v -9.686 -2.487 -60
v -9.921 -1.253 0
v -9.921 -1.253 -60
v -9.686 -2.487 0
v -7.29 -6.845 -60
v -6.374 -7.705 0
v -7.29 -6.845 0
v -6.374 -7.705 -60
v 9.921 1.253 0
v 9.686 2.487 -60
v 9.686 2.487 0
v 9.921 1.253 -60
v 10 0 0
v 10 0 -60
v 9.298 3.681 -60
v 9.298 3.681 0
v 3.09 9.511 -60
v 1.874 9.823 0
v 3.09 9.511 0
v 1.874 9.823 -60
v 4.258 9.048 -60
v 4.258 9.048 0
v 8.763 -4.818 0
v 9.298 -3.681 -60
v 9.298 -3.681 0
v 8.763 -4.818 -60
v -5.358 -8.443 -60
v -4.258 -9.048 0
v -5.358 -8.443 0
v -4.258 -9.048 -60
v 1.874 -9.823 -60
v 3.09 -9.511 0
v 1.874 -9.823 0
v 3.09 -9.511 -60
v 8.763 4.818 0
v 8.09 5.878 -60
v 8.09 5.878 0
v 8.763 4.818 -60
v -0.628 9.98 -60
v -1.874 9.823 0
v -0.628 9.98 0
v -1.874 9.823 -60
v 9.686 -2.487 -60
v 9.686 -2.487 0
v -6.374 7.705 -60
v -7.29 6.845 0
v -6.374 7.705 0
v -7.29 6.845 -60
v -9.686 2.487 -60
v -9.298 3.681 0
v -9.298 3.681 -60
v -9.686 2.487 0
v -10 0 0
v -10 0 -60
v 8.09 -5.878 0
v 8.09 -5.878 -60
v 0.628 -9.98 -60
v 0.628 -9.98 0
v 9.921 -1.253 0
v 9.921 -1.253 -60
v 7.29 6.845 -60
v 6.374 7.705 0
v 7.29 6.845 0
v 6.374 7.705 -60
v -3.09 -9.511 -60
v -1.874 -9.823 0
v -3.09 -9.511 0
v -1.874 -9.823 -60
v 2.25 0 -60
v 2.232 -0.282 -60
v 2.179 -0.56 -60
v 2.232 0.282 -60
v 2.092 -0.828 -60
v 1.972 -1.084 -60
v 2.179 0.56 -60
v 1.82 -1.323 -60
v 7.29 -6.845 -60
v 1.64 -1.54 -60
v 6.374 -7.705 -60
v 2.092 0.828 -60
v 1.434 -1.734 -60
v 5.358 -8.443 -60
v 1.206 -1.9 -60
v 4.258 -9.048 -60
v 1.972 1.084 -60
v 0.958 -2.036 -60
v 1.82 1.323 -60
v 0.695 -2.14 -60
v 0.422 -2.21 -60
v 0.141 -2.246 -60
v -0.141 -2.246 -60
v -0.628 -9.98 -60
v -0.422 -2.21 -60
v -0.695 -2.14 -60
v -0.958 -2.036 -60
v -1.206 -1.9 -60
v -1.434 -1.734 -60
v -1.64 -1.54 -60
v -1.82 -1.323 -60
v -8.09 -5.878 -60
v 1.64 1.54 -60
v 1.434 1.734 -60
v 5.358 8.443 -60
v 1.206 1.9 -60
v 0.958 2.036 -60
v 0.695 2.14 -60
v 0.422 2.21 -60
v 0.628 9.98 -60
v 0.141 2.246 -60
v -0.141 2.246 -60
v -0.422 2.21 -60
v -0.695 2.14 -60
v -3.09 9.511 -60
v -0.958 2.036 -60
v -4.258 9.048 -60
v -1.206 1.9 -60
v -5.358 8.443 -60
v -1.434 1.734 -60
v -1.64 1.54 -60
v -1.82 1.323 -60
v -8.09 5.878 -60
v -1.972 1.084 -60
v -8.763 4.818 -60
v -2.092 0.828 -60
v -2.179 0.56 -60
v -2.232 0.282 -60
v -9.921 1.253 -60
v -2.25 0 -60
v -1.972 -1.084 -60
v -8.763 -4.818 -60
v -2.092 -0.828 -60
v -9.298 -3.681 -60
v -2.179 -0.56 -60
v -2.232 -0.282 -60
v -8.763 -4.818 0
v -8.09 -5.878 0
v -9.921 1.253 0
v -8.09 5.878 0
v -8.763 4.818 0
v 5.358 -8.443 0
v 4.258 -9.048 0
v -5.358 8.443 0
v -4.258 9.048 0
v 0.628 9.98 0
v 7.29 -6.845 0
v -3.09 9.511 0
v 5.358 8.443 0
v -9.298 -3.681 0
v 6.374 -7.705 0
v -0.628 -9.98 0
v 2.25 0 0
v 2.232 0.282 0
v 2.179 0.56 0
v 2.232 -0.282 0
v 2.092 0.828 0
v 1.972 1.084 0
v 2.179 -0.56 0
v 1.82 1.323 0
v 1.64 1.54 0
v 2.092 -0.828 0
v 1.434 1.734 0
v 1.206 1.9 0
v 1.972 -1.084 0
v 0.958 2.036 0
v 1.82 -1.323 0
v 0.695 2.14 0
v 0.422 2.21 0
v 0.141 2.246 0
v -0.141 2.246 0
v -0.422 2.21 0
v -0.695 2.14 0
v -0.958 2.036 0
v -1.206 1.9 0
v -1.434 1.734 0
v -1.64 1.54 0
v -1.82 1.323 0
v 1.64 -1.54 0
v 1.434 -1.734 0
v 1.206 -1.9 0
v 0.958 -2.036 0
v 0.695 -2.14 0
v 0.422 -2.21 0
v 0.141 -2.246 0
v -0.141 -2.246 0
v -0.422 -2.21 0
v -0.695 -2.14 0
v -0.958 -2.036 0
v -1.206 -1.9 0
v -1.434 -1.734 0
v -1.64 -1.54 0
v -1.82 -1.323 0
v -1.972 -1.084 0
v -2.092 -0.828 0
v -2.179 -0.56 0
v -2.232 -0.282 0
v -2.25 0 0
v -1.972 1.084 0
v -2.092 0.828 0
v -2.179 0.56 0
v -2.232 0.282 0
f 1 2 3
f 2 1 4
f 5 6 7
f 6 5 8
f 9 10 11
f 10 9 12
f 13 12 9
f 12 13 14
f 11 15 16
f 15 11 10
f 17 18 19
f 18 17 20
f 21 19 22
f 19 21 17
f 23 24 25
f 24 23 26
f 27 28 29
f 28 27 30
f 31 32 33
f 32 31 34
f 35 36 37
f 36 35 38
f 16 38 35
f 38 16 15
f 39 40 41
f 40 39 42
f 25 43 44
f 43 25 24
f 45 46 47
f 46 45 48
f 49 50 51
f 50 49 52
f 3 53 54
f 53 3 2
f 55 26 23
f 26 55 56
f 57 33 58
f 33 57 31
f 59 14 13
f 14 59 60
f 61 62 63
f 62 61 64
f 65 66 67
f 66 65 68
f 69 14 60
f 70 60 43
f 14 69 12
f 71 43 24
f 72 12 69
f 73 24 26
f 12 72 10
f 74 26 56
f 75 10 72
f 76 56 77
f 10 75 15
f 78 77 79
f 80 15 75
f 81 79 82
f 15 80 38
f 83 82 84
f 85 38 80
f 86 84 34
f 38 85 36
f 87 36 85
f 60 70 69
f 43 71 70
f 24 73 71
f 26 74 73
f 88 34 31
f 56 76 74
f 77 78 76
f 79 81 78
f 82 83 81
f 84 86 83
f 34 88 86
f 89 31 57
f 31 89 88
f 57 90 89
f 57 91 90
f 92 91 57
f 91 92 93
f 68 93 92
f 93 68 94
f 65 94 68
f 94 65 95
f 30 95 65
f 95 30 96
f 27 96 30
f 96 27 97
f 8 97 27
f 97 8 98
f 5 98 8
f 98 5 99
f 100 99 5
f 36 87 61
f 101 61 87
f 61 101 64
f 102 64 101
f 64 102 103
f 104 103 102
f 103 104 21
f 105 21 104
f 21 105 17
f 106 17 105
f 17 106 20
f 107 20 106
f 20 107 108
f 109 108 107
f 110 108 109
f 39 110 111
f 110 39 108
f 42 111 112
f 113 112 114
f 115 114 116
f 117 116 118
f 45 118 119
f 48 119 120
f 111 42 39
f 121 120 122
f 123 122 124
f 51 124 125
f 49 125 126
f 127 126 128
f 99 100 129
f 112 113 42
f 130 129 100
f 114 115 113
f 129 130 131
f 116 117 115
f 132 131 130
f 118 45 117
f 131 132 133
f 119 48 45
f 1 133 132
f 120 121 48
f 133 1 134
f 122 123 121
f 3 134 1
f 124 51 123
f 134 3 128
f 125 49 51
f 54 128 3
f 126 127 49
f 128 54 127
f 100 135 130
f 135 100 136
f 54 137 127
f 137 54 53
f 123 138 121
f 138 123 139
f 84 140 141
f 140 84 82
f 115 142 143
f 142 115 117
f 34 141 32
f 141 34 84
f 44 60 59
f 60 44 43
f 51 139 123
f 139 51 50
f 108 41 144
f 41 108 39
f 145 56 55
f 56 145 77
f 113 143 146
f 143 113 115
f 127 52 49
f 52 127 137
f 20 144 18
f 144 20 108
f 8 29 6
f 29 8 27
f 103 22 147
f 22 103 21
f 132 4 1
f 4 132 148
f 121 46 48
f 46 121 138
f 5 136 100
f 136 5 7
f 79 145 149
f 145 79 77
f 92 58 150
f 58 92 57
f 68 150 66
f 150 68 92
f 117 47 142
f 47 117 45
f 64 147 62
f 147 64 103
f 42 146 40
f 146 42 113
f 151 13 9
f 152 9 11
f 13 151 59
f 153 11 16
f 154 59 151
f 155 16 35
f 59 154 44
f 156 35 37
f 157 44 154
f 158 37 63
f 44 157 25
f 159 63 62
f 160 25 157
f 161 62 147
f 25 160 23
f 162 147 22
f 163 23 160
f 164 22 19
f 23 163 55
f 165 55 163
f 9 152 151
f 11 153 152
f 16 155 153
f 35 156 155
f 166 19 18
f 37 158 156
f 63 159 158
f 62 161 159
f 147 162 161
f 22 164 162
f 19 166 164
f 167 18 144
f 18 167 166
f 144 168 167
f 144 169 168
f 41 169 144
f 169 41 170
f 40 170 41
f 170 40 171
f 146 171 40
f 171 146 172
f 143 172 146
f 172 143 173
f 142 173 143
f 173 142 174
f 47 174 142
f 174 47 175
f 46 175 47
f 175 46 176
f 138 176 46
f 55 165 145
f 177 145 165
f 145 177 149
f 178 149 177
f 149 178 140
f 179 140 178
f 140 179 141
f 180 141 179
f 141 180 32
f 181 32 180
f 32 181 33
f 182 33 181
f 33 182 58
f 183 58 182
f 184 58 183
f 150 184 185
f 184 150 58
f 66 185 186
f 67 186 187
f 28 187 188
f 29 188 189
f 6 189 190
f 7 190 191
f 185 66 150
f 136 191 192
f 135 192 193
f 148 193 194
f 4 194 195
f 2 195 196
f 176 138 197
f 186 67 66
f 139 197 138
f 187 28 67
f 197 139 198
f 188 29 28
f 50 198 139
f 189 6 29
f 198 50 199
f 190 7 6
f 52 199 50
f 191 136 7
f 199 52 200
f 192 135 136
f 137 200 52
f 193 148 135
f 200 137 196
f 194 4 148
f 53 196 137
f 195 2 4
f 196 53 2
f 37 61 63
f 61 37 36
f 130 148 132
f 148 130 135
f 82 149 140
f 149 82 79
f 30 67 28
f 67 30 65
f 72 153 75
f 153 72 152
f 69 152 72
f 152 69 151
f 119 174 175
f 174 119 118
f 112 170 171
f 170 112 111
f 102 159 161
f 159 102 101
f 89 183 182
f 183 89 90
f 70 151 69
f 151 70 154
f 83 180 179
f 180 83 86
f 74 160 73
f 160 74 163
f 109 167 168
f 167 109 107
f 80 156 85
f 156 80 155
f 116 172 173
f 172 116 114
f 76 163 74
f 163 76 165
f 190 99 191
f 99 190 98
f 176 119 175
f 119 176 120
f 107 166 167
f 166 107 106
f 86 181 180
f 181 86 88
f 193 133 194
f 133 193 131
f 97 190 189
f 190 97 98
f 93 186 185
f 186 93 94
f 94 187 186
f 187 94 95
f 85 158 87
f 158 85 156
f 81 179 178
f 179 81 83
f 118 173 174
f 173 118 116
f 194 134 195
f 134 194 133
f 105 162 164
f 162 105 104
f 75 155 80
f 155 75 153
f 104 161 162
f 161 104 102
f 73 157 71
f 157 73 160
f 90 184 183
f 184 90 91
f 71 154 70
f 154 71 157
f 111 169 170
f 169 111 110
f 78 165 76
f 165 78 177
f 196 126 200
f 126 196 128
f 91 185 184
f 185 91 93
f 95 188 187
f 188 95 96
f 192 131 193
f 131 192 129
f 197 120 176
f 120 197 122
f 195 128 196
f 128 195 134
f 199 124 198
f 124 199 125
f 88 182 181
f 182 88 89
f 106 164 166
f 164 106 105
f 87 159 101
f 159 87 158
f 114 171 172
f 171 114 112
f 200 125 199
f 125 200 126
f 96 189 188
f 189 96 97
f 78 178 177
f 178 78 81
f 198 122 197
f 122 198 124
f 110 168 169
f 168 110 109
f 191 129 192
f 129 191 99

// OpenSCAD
$fn = 50;


difference() {
	union() {
		translate(v = [0, 0, -60.0000000000]) {
			cylinder(h = 60, r = 10.0000000000);
		}
		cylinder(h = 0, r = 16.0000000000);
	}
	union() {
		#translate(v = [0, 0, -60]) {
			cylinder(h = 60, r = 2.2500000000);
		}
	}
}
